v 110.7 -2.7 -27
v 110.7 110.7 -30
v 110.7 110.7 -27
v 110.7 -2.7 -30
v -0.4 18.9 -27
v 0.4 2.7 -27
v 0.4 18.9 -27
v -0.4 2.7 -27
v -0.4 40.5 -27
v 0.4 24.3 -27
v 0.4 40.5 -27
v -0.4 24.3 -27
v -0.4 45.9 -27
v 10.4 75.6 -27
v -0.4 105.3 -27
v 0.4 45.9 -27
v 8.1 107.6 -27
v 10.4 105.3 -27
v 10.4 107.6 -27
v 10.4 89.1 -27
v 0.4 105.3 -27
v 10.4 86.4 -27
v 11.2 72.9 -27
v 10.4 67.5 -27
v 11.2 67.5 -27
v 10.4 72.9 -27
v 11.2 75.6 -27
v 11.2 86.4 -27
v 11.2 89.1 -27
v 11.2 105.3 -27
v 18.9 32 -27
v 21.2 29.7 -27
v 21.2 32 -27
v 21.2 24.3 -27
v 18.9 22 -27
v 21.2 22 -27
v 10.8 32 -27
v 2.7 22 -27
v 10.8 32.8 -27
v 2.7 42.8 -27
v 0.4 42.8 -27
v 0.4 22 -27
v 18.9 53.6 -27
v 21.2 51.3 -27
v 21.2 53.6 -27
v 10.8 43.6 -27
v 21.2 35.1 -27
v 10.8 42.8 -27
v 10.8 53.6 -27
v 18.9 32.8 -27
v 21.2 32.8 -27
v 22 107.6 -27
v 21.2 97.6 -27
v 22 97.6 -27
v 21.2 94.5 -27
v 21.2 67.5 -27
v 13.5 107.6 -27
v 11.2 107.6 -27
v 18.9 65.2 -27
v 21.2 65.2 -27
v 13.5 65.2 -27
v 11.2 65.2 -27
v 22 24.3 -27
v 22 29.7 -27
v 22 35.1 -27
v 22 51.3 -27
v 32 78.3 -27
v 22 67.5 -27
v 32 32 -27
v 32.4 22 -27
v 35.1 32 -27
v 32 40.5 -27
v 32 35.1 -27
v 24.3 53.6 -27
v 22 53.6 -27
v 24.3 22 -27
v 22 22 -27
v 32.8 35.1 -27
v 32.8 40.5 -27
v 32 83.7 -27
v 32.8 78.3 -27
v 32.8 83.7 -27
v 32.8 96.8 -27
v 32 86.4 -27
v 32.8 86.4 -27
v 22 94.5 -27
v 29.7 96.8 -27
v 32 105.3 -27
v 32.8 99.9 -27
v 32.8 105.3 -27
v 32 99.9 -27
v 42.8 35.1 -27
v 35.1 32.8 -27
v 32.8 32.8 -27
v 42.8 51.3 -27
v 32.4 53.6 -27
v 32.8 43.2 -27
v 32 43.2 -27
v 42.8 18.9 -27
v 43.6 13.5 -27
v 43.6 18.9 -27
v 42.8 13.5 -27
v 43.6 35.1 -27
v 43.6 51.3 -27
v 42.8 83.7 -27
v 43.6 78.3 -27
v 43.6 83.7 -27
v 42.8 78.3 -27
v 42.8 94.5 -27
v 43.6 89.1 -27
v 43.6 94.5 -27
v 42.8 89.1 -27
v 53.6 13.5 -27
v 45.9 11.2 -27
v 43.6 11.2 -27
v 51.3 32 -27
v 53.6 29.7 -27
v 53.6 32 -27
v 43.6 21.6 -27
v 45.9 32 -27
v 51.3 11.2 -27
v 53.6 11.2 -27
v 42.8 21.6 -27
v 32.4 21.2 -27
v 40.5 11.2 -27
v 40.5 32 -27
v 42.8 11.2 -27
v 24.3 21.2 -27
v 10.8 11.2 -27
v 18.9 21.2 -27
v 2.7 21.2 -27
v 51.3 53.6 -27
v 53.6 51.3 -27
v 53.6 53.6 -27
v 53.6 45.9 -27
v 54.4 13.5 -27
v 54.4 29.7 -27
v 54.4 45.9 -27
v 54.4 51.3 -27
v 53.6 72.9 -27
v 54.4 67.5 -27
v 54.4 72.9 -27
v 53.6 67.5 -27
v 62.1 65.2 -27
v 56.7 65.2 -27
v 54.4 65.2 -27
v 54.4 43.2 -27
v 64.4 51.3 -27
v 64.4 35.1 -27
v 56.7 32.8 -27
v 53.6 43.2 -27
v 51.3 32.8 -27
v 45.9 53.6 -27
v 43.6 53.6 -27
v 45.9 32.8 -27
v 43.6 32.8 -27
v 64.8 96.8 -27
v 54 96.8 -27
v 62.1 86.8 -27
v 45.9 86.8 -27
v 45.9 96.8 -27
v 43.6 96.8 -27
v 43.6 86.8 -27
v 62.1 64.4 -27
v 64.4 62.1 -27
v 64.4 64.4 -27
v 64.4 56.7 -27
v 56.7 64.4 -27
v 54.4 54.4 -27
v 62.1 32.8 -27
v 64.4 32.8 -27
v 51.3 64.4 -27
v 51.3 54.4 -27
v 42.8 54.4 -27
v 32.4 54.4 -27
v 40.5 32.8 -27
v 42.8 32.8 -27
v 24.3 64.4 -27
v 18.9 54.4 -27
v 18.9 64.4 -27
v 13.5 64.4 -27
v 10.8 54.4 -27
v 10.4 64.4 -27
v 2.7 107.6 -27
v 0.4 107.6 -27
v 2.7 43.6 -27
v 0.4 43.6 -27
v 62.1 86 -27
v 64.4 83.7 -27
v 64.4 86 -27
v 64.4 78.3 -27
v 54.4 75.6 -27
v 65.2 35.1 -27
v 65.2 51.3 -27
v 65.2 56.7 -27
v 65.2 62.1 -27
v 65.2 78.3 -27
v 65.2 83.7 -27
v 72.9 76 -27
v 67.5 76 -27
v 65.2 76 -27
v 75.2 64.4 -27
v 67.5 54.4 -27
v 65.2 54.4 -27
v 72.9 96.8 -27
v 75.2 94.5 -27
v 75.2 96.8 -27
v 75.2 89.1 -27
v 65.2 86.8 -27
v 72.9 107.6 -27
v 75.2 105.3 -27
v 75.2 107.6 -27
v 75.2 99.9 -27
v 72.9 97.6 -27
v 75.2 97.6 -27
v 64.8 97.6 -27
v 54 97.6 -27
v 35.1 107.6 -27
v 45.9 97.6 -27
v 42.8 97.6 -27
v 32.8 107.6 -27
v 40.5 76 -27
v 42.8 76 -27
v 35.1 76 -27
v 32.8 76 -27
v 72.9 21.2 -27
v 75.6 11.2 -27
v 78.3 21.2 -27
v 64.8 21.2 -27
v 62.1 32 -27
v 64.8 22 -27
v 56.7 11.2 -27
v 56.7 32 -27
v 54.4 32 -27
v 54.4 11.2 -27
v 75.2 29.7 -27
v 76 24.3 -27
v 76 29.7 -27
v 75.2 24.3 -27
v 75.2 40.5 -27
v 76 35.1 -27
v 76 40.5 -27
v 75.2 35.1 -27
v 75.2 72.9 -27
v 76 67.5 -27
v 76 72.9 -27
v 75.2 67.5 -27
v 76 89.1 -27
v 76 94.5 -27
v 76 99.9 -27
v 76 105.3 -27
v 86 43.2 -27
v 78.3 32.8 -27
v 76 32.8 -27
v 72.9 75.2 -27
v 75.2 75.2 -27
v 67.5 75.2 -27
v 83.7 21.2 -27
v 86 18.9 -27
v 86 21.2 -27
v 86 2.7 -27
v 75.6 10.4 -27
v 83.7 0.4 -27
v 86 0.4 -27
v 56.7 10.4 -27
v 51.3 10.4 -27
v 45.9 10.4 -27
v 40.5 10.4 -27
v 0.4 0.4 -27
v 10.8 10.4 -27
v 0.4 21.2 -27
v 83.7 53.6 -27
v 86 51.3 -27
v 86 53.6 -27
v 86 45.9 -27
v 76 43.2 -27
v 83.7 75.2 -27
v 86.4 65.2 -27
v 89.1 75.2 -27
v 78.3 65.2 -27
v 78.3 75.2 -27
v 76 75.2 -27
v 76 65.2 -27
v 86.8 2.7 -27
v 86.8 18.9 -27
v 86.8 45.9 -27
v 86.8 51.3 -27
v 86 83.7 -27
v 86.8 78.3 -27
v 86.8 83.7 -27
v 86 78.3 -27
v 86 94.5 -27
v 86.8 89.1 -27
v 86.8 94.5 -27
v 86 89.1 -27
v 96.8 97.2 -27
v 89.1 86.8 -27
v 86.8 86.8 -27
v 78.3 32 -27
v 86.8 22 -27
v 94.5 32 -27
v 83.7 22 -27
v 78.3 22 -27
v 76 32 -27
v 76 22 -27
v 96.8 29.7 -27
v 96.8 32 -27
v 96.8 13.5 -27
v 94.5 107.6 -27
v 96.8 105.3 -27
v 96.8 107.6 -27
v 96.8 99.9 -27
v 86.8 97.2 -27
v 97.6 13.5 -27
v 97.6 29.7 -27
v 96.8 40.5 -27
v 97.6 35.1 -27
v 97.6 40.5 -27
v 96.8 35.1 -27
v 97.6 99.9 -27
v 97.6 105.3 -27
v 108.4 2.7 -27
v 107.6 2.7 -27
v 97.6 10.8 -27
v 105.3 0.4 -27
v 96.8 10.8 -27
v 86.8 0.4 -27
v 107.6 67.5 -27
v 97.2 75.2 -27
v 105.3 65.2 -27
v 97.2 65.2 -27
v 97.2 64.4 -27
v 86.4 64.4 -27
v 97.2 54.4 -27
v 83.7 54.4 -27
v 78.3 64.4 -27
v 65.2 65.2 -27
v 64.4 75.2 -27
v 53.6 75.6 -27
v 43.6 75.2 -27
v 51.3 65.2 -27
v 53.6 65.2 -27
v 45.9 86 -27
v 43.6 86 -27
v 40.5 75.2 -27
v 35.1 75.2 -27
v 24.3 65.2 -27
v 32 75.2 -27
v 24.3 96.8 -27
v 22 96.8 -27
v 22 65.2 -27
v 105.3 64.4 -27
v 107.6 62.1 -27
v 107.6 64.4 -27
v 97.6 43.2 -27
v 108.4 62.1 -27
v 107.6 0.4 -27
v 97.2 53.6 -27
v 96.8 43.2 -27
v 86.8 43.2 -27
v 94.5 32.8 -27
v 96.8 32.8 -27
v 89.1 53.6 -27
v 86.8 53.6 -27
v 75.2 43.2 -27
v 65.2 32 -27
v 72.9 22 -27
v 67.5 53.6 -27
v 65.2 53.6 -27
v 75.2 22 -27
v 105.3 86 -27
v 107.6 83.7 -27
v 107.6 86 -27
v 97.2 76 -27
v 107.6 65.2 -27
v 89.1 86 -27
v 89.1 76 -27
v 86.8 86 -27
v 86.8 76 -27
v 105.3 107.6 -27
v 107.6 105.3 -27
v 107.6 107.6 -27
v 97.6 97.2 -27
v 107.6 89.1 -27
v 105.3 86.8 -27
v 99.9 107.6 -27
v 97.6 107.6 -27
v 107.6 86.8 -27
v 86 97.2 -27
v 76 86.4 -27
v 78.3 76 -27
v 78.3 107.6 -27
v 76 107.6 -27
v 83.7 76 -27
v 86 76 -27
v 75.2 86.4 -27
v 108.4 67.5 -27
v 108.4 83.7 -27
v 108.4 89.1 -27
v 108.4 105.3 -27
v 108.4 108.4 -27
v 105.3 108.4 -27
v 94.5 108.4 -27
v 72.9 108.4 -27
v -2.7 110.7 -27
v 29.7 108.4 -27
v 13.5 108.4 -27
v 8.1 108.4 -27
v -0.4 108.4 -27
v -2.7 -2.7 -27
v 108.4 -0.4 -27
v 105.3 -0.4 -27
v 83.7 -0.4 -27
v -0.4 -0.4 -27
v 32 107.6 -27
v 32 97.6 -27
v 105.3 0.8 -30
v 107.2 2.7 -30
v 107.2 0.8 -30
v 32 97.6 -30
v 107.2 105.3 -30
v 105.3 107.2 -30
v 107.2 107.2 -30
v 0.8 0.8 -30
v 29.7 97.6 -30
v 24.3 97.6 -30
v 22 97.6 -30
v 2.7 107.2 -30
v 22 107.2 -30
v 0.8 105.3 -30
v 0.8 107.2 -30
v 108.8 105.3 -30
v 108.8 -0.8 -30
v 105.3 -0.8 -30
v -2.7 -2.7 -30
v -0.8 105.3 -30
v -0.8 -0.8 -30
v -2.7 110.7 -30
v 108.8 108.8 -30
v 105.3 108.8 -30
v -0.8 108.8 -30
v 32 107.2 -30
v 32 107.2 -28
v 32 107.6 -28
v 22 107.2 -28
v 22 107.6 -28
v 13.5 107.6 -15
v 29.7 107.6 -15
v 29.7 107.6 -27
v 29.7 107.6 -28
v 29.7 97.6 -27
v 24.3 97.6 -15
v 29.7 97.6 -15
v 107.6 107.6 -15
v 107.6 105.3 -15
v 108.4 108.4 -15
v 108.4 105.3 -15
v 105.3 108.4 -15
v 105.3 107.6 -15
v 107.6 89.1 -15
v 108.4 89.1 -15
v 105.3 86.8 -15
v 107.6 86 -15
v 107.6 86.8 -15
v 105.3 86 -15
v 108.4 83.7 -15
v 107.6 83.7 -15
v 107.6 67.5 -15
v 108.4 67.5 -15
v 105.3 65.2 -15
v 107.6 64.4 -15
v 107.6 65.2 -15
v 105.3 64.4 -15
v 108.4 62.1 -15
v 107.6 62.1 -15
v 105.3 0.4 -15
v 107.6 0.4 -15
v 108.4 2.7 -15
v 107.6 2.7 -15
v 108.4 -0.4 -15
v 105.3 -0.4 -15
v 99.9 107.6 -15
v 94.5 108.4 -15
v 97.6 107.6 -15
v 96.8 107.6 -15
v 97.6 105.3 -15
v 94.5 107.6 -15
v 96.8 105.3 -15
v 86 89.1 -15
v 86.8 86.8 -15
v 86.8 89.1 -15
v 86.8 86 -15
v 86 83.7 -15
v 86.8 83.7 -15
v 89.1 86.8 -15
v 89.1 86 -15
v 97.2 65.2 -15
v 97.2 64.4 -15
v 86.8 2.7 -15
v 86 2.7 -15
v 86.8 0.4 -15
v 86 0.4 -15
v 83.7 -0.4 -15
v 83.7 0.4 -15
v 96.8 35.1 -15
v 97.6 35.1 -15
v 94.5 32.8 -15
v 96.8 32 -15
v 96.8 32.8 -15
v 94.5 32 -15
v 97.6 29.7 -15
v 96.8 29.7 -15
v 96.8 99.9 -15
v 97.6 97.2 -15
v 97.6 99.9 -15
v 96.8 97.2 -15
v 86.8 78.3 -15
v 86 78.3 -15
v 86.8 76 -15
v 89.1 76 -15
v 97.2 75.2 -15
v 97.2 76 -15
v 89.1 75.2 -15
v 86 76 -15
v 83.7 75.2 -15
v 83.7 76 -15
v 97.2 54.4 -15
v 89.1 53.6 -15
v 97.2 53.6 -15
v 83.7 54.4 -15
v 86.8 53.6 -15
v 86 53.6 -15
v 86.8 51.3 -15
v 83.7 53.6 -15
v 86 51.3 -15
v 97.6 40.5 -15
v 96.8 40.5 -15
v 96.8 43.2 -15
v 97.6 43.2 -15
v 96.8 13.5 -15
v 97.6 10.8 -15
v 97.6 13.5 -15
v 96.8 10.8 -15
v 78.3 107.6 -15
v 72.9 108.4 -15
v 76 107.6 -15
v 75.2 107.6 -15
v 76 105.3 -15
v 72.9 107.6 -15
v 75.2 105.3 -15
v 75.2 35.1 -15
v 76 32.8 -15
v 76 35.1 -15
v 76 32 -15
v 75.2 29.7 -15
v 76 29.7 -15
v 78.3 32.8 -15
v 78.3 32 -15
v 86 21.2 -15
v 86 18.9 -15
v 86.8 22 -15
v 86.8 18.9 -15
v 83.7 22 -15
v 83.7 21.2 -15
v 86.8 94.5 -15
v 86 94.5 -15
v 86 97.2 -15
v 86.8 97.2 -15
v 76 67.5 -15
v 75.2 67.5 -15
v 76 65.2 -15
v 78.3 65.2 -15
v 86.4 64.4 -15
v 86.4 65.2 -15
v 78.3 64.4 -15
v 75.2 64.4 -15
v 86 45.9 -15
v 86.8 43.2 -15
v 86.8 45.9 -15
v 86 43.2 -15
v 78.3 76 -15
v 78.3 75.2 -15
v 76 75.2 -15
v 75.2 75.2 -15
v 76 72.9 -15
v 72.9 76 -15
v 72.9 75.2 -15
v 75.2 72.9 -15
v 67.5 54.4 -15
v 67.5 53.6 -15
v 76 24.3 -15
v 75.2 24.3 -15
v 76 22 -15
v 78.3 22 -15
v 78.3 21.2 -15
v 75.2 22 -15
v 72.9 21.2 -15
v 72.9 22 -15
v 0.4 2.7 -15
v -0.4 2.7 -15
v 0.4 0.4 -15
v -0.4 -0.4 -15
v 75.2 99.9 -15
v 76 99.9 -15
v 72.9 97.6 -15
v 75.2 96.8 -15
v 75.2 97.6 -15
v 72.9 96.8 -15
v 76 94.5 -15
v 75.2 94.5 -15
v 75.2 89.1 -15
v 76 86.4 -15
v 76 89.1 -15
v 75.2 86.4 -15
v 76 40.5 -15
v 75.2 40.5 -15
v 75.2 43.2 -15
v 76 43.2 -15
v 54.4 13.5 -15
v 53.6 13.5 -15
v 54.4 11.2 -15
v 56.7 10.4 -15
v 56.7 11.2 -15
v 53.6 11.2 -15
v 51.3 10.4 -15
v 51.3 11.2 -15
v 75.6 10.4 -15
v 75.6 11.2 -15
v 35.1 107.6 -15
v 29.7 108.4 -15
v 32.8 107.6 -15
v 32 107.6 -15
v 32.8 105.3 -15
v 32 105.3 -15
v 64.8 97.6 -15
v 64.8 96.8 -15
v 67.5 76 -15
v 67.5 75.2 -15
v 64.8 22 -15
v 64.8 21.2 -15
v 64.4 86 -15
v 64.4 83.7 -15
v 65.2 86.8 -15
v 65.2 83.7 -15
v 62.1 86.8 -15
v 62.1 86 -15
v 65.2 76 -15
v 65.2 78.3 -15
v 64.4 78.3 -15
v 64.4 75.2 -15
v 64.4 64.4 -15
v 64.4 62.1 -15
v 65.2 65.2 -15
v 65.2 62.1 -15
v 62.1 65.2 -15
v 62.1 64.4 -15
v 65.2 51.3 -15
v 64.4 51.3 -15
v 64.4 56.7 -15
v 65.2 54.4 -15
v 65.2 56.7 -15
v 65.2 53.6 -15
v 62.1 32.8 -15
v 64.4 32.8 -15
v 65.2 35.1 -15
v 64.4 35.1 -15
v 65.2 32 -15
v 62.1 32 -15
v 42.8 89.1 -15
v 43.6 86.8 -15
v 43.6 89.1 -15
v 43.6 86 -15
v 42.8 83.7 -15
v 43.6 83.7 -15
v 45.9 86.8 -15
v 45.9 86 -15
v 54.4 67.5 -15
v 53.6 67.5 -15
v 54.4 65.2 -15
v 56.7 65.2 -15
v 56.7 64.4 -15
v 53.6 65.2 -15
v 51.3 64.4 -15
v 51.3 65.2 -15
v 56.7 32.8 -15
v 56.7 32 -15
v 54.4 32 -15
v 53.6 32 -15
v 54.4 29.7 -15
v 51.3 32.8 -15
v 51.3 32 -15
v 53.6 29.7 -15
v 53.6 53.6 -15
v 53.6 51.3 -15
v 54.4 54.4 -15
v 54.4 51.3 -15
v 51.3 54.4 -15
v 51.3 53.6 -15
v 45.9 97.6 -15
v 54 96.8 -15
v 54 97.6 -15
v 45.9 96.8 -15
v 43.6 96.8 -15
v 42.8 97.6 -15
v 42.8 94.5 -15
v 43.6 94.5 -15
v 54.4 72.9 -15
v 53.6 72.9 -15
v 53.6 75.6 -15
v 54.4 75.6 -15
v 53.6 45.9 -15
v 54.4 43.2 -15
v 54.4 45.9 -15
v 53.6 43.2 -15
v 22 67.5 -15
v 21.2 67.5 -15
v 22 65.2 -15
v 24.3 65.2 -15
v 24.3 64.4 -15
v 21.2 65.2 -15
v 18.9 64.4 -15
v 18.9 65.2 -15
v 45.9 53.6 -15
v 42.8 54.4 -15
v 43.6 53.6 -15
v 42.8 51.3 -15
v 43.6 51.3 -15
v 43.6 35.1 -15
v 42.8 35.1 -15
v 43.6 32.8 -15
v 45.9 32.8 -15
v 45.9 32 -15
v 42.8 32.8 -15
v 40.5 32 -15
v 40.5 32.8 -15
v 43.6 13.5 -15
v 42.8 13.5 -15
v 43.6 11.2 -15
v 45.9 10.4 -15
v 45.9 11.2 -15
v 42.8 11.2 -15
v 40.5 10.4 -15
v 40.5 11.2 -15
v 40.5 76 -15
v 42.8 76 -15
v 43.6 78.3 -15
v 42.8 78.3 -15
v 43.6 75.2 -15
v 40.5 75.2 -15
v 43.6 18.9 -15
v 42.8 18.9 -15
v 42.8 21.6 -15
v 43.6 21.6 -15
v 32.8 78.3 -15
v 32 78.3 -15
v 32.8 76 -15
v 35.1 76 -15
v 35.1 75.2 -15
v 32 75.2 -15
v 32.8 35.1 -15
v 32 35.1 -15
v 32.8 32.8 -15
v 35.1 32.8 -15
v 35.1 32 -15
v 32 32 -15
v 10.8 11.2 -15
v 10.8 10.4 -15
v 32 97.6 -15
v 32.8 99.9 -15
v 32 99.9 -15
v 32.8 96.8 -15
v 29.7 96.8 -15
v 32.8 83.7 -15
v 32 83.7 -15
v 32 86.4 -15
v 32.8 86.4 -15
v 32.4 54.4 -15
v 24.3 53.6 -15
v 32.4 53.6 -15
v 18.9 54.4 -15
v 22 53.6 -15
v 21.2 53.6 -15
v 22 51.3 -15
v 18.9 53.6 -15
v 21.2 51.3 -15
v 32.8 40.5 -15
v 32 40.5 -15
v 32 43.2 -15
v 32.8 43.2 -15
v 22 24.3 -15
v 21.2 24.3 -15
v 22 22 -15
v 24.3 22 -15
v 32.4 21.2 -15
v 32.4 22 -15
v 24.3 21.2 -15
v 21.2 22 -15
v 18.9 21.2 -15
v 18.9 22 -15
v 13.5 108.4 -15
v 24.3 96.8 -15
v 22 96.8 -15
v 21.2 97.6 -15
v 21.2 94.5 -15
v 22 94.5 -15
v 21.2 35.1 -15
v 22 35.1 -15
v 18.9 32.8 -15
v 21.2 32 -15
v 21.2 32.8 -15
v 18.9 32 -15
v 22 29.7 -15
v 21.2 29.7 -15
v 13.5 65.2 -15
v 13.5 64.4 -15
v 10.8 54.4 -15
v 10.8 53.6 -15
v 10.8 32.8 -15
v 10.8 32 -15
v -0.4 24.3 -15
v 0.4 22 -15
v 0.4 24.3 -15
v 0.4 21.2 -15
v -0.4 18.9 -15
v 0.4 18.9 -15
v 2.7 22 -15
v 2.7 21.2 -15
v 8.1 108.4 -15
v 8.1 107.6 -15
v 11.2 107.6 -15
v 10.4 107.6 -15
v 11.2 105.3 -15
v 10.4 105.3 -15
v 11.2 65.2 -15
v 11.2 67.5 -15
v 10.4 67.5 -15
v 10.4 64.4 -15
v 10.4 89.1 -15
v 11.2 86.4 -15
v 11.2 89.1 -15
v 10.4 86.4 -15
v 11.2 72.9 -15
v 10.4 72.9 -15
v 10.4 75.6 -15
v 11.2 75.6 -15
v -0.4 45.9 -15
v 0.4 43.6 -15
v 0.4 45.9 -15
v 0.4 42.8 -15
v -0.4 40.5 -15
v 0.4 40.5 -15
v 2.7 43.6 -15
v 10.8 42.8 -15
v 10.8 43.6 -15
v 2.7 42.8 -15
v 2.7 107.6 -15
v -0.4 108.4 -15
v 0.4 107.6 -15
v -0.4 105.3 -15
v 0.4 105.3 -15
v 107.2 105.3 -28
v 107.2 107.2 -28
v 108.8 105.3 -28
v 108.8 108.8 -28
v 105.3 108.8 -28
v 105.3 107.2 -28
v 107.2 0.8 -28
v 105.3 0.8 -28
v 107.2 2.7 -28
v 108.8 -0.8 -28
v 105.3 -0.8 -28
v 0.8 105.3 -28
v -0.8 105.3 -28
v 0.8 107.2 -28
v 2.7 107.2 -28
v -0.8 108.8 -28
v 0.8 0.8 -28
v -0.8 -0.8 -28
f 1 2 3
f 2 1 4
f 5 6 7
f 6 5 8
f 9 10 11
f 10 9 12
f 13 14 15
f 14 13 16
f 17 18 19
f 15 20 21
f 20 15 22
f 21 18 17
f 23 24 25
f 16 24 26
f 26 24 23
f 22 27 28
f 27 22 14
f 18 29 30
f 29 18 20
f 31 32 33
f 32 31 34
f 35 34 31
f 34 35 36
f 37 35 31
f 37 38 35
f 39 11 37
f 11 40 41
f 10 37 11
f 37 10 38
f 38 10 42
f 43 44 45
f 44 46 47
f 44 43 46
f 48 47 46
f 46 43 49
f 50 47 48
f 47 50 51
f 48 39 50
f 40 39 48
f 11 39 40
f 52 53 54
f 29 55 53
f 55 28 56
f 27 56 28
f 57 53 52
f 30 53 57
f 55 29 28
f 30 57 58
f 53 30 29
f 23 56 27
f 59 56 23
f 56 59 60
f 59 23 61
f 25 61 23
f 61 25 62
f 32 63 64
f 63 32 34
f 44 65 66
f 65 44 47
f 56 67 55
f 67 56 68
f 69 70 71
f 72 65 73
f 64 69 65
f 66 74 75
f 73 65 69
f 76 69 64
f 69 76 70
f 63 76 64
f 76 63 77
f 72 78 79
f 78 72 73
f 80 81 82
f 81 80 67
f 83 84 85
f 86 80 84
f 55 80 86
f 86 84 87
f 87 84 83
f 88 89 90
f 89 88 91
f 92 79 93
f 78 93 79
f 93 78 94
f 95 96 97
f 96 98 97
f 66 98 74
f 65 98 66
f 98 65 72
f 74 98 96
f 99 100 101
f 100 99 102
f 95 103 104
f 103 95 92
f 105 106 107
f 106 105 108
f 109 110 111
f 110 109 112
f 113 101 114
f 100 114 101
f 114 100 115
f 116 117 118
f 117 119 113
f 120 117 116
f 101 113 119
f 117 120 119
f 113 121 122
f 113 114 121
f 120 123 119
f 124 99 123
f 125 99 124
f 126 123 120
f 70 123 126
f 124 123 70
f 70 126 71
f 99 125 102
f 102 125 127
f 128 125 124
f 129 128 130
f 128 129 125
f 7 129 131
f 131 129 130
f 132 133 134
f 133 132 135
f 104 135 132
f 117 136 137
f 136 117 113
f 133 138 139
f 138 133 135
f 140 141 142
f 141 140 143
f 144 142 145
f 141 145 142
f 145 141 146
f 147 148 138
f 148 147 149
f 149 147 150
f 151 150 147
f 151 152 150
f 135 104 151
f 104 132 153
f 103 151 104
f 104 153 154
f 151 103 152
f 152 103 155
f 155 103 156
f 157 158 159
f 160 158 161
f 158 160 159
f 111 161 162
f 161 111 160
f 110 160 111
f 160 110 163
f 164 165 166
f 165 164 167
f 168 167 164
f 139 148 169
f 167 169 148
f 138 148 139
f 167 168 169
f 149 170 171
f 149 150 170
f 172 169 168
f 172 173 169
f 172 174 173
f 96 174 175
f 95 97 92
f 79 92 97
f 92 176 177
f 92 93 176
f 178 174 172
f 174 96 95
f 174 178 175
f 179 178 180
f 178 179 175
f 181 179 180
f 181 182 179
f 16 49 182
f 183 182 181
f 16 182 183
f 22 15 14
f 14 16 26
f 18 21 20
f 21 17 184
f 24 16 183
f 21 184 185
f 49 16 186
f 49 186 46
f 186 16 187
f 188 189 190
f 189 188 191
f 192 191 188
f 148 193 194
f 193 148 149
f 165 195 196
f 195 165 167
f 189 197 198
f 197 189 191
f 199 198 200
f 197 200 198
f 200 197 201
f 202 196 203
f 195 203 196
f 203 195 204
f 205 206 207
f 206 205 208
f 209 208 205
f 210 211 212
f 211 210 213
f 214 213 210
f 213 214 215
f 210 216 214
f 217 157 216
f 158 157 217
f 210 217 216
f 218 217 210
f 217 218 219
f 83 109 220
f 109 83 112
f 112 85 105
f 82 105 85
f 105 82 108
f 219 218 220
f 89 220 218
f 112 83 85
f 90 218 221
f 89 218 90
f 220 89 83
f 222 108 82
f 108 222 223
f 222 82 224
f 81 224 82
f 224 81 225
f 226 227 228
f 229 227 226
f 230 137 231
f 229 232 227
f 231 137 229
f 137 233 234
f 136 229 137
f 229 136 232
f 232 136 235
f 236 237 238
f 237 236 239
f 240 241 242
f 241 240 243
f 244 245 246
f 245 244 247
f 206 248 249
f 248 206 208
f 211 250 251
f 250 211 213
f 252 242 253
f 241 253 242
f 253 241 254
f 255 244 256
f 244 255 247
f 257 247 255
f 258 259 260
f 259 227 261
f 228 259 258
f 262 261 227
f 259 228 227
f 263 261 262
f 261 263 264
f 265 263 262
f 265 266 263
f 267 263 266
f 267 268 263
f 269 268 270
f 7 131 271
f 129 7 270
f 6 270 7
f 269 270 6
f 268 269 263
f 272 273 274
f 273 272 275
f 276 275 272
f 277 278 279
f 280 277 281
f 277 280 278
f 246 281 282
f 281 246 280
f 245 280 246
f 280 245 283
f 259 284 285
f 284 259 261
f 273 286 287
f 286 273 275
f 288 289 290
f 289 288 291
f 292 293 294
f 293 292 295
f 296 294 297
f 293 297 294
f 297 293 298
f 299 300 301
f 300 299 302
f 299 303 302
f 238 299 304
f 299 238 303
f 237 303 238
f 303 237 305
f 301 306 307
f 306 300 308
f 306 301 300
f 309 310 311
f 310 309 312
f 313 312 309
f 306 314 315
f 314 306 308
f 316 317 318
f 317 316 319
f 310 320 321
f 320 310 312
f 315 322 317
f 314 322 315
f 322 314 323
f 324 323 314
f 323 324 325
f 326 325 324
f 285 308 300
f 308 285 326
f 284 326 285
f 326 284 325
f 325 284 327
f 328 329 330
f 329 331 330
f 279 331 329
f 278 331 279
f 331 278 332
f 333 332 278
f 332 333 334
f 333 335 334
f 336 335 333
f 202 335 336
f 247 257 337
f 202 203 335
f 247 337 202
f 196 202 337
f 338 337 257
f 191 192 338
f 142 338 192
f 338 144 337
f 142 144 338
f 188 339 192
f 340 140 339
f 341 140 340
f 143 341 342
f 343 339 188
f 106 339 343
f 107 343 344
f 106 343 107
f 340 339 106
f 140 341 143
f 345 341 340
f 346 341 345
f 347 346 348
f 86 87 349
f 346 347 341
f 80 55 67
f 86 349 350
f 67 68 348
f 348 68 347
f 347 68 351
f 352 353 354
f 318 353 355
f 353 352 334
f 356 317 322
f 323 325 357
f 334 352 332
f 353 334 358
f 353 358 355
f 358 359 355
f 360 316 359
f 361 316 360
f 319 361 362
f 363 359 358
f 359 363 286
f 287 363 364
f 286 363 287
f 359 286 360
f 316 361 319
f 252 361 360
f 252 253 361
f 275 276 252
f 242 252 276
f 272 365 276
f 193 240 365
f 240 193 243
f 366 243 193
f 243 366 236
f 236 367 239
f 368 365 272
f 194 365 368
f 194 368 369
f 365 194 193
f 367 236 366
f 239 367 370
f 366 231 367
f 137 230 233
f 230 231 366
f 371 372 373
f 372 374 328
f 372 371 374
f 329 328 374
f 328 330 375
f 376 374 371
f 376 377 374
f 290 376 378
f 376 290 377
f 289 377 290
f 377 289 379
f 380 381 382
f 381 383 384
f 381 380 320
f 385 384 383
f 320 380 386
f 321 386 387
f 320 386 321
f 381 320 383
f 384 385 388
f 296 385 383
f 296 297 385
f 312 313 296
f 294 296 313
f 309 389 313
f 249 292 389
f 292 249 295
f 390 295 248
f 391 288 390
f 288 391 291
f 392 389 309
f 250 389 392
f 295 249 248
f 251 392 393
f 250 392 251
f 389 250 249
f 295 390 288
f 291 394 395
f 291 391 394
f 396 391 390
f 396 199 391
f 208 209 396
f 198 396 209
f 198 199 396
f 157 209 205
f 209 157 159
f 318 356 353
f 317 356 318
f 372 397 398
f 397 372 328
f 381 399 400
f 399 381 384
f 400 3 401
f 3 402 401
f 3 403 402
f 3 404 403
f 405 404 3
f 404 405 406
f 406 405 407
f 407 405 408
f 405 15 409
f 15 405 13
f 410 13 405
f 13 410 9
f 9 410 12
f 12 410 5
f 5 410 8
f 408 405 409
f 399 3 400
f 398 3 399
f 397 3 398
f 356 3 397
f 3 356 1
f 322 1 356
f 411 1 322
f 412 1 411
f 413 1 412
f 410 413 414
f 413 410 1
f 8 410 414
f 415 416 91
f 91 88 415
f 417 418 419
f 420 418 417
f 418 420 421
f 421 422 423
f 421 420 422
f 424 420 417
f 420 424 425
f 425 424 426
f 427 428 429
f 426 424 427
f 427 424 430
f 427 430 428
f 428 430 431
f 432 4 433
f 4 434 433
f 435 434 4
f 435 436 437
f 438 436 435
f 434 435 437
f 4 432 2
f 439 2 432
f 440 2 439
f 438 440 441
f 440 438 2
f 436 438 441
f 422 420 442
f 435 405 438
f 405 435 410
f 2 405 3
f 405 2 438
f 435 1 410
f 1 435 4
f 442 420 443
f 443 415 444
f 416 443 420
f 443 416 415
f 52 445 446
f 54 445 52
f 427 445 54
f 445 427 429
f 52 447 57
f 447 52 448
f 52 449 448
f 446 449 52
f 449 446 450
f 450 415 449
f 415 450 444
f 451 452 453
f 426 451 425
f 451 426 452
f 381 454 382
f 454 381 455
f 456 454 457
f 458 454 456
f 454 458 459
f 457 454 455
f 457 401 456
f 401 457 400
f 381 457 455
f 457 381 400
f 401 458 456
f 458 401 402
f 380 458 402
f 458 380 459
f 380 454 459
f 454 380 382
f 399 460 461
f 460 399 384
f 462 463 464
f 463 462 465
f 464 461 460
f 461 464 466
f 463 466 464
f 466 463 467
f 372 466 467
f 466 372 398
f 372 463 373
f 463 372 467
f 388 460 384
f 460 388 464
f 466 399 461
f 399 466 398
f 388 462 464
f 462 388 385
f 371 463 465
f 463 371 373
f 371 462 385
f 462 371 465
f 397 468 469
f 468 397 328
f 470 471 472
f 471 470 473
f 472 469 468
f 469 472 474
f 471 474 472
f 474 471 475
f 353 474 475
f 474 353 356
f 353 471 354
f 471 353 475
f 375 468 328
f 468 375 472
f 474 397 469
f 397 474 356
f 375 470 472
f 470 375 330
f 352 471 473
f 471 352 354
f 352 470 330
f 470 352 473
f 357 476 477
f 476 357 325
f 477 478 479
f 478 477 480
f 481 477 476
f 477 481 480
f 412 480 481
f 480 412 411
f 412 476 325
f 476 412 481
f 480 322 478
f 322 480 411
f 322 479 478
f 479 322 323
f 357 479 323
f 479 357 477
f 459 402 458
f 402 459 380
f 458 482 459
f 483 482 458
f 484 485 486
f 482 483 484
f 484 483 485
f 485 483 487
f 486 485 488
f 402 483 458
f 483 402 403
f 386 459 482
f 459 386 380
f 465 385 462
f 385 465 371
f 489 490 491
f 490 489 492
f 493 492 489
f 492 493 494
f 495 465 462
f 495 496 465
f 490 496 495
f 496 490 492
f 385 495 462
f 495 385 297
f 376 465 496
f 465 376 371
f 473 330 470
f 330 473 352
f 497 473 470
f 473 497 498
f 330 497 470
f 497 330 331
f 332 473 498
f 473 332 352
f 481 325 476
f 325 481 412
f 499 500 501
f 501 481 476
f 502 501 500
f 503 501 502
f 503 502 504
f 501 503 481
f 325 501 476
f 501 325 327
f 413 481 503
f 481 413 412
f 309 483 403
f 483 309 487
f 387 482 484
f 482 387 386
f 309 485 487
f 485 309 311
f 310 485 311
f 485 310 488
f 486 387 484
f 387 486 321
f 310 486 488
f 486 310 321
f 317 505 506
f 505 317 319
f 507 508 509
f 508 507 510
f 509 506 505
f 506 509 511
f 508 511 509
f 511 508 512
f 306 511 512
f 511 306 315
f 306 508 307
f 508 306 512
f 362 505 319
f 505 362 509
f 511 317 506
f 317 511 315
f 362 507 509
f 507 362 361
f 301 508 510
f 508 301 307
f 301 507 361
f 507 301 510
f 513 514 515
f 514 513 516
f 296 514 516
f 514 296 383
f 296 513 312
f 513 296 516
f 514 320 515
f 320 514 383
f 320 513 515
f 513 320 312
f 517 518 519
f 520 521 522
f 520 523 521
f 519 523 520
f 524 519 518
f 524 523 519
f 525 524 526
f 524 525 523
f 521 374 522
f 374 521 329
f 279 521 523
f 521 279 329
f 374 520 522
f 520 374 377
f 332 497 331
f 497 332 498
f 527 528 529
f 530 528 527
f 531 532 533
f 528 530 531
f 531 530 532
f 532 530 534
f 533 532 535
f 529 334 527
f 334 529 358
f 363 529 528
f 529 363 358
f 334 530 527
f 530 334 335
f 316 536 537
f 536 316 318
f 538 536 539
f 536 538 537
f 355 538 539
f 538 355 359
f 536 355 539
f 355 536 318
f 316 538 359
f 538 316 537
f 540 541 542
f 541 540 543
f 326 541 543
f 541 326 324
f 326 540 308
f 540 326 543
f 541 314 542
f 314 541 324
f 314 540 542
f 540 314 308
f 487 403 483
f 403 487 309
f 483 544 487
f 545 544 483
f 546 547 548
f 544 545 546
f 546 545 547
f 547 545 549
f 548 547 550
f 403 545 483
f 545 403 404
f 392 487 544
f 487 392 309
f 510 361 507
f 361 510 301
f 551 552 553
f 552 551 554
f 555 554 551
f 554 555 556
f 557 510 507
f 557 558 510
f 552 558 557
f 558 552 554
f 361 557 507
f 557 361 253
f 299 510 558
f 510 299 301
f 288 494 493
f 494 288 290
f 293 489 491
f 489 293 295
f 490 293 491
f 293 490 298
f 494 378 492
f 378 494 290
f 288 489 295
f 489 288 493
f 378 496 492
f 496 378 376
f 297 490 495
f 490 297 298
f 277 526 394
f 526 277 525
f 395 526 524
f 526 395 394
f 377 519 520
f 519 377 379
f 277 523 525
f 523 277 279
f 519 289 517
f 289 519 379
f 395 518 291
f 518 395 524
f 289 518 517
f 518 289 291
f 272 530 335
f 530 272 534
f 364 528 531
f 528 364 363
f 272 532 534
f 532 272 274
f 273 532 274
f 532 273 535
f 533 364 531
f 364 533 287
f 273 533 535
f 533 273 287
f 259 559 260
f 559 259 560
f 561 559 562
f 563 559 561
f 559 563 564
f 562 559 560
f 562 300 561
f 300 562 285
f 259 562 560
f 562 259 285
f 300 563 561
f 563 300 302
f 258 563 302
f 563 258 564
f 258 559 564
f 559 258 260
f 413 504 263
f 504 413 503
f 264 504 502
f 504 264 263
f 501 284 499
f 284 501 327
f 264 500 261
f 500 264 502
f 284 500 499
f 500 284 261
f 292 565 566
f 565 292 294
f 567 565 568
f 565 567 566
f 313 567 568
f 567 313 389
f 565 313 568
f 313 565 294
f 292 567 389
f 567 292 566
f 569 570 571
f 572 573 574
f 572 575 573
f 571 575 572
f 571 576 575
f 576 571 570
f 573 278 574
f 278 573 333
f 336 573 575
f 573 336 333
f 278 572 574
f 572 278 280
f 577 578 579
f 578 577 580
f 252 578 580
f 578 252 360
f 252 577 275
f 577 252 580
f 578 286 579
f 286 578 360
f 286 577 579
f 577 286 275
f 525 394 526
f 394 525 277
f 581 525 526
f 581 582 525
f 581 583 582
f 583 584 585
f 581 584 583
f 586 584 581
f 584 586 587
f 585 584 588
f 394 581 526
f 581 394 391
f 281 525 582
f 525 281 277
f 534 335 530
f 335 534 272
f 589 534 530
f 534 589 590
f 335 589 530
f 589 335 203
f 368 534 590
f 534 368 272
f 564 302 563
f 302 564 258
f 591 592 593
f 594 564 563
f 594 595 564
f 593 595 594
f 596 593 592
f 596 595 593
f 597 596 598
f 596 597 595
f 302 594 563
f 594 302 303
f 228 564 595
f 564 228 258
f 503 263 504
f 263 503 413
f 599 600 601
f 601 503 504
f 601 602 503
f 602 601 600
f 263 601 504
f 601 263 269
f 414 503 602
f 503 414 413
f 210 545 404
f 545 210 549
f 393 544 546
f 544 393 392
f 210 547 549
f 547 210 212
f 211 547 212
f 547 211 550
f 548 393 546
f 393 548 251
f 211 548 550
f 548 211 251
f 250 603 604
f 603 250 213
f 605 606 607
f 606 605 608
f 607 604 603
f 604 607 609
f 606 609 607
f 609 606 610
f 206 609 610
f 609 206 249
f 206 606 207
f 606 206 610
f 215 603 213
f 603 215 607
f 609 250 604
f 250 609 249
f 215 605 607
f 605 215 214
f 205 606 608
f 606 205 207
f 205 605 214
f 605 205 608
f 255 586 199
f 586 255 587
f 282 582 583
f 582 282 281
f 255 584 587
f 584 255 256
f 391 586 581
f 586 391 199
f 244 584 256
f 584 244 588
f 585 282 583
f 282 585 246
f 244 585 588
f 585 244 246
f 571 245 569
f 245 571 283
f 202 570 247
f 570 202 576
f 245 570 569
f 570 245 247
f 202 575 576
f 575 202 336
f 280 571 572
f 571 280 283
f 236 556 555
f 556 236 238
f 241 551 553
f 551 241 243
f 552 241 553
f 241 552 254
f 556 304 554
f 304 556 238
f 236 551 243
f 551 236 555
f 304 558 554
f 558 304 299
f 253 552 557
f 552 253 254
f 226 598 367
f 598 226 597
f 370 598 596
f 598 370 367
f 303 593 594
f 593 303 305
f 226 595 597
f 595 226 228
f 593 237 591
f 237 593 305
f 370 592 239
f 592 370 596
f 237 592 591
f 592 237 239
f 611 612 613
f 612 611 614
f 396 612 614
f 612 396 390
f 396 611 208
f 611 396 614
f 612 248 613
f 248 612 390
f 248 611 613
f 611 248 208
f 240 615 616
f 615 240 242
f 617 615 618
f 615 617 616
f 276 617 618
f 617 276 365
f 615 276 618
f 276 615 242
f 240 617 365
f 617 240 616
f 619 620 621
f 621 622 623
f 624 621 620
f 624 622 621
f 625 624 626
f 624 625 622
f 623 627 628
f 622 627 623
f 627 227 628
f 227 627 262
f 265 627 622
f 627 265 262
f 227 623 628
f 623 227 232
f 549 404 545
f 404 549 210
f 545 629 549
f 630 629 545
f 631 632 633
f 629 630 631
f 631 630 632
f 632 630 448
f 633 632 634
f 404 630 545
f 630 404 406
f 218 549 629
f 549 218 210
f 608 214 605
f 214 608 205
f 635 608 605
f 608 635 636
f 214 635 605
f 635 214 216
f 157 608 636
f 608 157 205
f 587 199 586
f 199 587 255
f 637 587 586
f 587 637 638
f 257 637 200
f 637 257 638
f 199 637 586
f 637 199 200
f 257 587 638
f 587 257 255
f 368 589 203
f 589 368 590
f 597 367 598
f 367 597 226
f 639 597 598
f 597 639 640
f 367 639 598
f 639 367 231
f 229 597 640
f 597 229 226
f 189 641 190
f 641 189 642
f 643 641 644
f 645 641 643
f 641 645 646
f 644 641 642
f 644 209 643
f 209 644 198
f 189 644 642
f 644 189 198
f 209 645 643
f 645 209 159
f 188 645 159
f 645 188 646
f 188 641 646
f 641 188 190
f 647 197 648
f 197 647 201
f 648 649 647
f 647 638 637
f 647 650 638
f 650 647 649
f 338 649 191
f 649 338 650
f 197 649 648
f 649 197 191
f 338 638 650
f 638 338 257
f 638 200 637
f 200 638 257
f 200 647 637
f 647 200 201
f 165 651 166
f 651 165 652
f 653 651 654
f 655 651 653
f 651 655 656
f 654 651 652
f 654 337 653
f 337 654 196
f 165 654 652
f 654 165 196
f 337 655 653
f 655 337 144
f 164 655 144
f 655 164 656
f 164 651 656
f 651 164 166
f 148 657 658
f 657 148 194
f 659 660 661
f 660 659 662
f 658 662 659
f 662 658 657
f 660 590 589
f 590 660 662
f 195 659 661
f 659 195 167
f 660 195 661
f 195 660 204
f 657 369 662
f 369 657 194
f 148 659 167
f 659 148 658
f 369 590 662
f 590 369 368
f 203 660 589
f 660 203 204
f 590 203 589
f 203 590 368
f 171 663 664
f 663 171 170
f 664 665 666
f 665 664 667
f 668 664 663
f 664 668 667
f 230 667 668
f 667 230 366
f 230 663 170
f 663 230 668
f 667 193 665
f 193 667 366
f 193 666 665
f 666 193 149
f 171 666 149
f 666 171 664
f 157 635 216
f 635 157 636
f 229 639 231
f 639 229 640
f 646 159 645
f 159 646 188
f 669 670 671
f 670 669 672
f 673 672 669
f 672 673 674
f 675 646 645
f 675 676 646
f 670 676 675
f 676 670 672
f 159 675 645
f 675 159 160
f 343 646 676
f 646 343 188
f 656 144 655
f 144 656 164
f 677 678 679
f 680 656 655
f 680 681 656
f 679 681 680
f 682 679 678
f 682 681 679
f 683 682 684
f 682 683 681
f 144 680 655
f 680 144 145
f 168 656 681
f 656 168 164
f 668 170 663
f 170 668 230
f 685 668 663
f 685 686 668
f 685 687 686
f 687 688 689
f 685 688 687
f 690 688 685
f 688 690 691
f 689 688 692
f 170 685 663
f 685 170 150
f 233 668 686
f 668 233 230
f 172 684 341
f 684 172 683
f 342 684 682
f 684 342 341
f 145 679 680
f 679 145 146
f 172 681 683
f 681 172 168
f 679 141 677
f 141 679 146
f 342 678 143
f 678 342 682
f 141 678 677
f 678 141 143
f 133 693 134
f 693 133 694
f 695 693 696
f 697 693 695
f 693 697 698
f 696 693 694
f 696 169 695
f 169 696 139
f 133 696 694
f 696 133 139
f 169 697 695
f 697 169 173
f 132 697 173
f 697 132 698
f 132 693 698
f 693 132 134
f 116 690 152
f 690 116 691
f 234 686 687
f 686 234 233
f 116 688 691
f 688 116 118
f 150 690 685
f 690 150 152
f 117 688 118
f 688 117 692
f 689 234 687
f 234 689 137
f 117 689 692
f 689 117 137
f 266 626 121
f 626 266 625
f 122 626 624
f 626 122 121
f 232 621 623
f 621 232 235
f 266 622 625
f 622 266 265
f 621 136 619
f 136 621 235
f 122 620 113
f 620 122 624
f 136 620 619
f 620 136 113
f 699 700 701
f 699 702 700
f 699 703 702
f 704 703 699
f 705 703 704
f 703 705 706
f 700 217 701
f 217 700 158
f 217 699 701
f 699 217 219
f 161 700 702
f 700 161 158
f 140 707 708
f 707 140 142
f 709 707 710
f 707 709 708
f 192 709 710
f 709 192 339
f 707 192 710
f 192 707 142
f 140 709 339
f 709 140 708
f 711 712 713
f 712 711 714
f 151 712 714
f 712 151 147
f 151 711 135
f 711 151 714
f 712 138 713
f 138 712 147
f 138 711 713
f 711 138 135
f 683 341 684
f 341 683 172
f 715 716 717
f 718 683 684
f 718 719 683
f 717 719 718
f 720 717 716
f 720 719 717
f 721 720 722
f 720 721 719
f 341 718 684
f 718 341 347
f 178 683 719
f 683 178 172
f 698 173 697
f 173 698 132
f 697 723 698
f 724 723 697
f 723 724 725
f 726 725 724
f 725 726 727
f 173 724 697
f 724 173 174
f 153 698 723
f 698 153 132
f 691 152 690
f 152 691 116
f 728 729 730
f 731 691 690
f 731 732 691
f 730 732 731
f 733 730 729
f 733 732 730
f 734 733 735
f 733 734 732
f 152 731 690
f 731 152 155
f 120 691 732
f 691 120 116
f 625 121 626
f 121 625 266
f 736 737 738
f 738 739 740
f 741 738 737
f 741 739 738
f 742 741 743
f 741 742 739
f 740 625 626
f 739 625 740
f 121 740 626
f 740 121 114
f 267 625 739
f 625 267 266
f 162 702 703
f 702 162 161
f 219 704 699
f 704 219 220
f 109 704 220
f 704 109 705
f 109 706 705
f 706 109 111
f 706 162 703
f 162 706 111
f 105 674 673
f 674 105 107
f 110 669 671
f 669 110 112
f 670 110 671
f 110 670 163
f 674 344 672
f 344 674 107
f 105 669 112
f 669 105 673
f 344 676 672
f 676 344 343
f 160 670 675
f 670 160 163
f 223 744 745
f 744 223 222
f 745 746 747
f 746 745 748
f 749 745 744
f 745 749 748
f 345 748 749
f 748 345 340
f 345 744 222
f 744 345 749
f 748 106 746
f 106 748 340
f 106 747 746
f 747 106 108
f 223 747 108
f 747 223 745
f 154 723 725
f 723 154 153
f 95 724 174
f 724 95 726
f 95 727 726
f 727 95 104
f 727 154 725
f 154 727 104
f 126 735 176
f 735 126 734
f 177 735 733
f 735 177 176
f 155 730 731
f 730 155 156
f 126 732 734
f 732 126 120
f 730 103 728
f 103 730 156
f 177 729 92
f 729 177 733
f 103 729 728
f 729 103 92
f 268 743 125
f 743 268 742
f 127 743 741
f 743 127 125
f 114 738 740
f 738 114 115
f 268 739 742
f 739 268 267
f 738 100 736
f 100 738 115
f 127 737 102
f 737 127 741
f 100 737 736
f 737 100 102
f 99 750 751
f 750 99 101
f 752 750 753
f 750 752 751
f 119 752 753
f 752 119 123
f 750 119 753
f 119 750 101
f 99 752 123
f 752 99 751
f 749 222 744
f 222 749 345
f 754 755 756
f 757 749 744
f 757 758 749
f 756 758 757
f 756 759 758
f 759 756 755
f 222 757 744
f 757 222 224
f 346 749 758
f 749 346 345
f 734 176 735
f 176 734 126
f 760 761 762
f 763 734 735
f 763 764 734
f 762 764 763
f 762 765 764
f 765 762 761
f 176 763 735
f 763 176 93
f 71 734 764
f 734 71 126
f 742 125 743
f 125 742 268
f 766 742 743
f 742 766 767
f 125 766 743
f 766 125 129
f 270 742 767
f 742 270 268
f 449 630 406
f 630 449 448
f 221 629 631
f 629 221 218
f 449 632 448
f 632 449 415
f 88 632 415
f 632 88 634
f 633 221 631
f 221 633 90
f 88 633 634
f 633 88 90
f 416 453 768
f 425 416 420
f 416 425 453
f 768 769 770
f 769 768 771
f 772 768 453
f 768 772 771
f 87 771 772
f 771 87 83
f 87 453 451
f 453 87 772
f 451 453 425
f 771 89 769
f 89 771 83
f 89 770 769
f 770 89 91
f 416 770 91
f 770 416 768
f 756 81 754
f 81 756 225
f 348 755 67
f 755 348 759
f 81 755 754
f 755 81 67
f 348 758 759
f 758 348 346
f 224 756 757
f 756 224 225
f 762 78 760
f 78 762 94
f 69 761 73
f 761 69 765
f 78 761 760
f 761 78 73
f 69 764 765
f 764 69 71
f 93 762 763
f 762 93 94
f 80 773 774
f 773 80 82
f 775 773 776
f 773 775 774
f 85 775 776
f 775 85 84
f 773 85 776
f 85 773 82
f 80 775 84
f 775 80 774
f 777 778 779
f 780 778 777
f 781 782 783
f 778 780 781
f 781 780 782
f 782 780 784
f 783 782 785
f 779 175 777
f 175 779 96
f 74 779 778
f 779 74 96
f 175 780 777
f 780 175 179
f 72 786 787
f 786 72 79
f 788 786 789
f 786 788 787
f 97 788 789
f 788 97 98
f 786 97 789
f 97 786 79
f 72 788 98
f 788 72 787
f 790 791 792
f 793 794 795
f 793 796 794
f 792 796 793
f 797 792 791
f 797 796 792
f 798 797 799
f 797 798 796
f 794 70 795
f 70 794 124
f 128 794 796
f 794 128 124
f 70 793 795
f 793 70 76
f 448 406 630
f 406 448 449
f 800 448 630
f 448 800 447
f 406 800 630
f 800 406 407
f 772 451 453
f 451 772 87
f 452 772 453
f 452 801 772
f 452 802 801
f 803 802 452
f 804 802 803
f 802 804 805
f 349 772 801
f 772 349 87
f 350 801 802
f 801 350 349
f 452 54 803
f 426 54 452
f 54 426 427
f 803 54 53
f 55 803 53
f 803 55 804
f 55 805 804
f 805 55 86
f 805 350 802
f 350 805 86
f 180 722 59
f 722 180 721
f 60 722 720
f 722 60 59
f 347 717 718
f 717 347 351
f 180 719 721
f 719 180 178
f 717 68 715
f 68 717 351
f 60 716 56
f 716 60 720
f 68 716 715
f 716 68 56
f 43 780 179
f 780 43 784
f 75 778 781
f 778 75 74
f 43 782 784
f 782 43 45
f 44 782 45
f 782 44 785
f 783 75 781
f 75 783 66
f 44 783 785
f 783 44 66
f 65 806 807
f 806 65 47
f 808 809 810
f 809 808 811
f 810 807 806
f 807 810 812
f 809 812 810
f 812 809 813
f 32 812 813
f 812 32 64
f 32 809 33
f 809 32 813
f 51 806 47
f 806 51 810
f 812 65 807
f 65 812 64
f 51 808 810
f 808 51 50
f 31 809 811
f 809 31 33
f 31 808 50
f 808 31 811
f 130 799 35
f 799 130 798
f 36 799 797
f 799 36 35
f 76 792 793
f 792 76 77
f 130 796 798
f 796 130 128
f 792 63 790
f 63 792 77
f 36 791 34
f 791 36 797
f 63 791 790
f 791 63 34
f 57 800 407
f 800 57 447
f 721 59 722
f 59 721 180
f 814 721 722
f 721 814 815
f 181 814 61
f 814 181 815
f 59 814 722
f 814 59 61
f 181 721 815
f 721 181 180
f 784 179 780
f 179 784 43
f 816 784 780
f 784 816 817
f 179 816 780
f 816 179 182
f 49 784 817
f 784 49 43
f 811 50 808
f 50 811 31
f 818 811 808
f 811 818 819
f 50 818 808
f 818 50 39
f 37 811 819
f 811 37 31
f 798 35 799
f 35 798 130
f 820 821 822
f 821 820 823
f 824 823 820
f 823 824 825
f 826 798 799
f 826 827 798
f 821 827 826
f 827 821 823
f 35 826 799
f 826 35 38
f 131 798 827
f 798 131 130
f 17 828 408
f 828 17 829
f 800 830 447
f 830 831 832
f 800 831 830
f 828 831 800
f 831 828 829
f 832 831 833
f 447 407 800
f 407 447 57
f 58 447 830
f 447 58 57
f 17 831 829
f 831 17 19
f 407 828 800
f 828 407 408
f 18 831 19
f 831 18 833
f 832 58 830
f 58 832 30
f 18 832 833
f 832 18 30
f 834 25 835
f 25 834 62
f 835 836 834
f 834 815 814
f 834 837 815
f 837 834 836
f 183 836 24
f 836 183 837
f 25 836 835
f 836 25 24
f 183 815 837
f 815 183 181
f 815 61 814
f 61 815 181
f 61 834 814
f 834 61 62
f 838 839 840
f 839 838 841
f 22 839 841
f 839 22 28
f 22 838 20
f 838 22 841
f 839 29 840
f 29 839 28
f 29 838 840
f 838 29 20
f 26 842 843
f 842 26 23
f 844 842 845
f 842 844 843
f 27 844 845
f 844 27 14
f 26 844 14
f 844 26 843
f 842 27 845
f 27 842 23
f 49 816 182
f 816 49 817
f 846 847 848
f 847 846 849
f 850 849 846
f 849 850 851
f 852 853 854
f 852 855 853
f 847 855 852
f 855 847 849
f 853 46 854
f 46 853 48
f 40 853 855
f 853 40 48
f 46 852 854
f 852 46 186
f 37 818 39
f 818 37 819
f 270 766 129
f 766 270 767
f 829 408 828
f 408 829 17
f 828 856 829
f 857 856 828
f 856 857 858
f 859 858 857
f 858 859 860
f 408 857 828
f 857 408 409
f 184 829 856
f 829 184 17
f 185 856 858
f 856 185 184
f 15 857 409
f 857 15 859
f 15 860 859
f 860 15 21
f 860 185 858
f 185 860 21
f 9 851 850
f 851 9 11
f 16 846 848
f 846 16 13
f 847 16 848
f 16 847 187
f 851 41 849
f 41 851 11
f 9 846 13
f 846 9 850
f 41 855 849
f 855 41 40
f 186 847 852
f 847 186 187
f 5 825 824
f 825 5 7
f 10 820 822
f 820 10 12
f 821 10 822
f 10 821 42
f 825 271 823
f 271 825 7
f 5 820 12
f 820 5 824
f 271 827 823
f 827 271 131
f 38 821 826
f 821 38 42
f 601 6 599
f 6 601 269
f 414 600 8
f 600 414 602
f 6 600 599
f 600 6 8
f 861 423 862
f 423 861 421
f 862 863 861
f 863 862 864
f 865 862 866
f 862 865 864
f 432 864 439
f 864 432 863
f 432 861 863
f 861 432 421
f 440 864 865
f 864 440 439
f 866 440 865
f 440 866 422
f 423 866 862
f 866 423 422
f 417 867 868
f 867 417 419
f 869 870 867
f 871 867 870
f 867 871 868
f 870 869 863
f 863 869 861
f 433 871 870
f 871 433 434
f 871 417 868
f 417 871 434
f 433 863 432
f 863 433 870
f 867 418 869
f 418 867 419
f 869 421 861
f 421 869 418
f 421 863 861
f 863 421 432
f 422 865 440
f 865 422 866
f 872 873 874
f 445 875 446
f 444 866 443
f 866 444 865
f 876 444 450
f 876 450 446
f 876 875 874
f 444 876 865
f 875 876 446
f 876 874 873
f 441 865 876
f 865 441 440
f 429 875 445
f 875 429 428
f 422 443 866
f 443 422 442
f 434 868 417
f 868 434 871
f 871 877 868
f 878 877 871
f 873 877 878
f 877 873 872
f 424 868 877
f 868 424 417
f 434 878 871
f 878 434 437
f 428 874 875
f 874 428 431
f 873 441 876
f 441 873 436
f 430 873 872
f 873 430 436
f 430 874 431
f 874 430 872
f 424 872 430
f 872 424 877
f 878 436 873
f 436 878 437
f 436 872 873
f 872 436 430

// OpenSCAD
// file: ../../code/enclosing-box.scad
module box(levels) {
    count = len(levels);
    l1 = levels[0];
    sw = len(l1);
    extraSpace = 3*nozzleDiameter;
    bt = nozzleDiameter*3; // box wall thickness
    
    b1Xs = sw*w + extraSpace; // box inside X size
    b1Ys = b1Xs;
    b1Zs = (wh-levelOverlap)*count+levelOverlap + extraSpace;
    
    
    echo("Box insides: ", b1Xs, b1Ys, b1Zs);
    rotate([180,0,0])
    difference() {
        translate([-bt, -bt, 0])
            cube([
                b1Xs+2*bt, 
                b1Ys+2*bt, 
                b1Zs+1*bt
            ]);
        cube([b1Xs, b1Ys, b1Zs]);

        
        // hole for ball entrance
        xy=extraSpace+w/2;
        translate([xy,xy,b1Zs+bt-2*layerHeight]) {
            holes(l1, STARTING_POINT);
        }

        
        translate([0,0,b1Zs+bt-2*layerHeight]) {
            // draw levels on box
            for(i = [1:count]) {
                marginX =     b1Ys/count   - extraSpace;
                marginY = (i*(b1Ys/count)) - extraSpace;
                translate([b1Xs-marginX, b1Ys-marginY, 0])
                levelContour(levels[i-1], count);
            }
        }
    }   
}


module levelContour(level, count) {
    // scale down to fit all mazes into one row on top of the box
    scale(1/count) {
        // count is used in wallThickness multiplication here to compensate scale down factor
        // also, to make walls visible better, increasing adding additional multiplication factor
        walls(level, 2*count*wallThickness); 
    }
}
// file: ../../code/main.scad
include <enclosing-box.scad>;

// DRAWING SYMBOLS
WALL_VERTICAL = "|";
WALL_VERTICAL_TOP = "╹";
WALL_VERTICAL_BOTTOM = "╻";
WALL_HORIZONTAL = "─";
WALL_HORIZONTAL_LEFT = "╸";
WALL_HORIZONTAL_RIGHT = "╺";

CORNER_PLUS="+";

CORNER_TOP_LEFT="┌";
CORNER_TOP_RIGHT= "┐";
CORNER_BOTTOM_RIGHT="┘";
CORNER_BOTTOM_LEFT="└";

CORNER_T="┬";
CORNER_T_DOWN="┴";
CORNER_T_LEFT="├";
CORNER_T_RIGHT="┤";

SPACE = " ";
HOLE = "X";
STARTING_POINT = "O";

template3x3 = [
"┌───────┐",
"|X      |",
"| ┌─┬─┐ |",
"| | ╹ | |",
"| ├╸+╺┤ |",
"| | ╻ | |",
"| └─┴─┘ |",
"|      O|",
"└───────┘"];


// PARAMETERS
ballSize = 12;

levelOverlap = 2; // how much below level should go into the bottom plate
bpt = levelOverlap + 1; // bottom plate thickness
nozzleDiameter = 0.4;
layerHeight = 0.2;
wallThickness = nozzleDiameter*2; // wall thickness
wh = ballSize+bpt+levelOverlap; // wall height


// VARIABLES
w = ballSize/2+wallThickness/2; // width of the cell


// HELPER METHODS
module labyrinthLevels(currentLevel, levelBelow) {
    difference() {
        labyrinth(currentLevel);
        translate([0,0,-wh+levelOverlap])
            labyrinth(levelBelow, wallThickness+nozzleDiameter*2); // add extra two lines space for walls' overlap
    }
}

module labyrinth(lab, wallThickness = wallThickness) {
    bottom(lab);
    walls(lab, wallThickness);
}

module bottom(lab) {
    sw=len(lab[0]);
    boardSize = sw*w;
    difference() {
        translate([-w/2,-w/2,0])
            cube([boardSize, boardSize, bpt]);
        holes(lab);
    }
}

module walls(lab, wallThickness=wallThickness) {
    sw=len(lab[0]);
    for(x=[0:sw-1]) {
        for(y=[0:sw-1]) {
            cell = lab[x][y];
            tx=sw-x-1; ty=sw-y-1;
            translate([tx*w, ty*w, 0]) {
                if (cell == WALL_VERTICAL) {
                    wallVertical(wallThickness);
                } else if (cell == WALL_VERTICAL_TOP) {
                    wallVerticalTop(wallThickness);
                } else if (cell == WALL_VERTICAL_BOTTOM) {
                    wallVerticalBottom(wallThickness);
                } else if (cell == WALL_HORIZONTAL) {
                    wallHorizontal(wallThickness);
                } else if (cell == WALL_HORIZONTAL_LEFT) {
                    wallHorizontalLeft(wallThickness);
                } else if (cell == WALL_HORIZONTAL_RIGHT) {
                    wallHorizontalRight(wallThickness);
                } else if (cell == CORNER_TOP_LEFT) {
                    cornerTopLeft(wallThickness);
                } else if (cell == CORNER_TOP_RIGHT) {
                    cornerTopRight(wallThickness);
                } else if (cell == CORNER_BOTTOM_RIGHT) {
                    cornerBottomRight(wallThickness);
                } else if (cell == CORNER_BOTTOM_LEFT) {
                    cornerBottomLeft(wallThickness);
                } else if (cell == CORNER_T) {
                    cornerT(wallThickness);
                } else if (cell == CORNER_T_RIGHT) {
                    cornerTRight(wallThickness);
                } else if (cell == CORNER_T_DOWN) {
                    cornerTDown(wallThickness);
                } else if (cell == CORNER_T_LEFT) {
                    cornerTLeft(wallThickness);
                } else if (cell == CORNER_PLUS) {
                    cornerPlus(wallThickness);
                }
            }
        }
    }
}

module holes(lab, holeSymbol = HOLE) {
    sw=len(lab[0]);
    for(x=[0:sw-1]) {
        for(y=[0:sw-1]) {
            cell = lab[x][y];
            if (cell == holeSymbol) {
                tx=sw-x-1; ty=sw-y-1;
                translate([tx*w, ty*w, 0]) {
                    hole();
                }
            }
        }
    }
}

module hole() {
    s=w+w-wallThickness;
    translate([-s/2,-s/2, -1])
        cube([s, s, bpt+2]);
}

module wallHorizontal(wallThickness) {
    rotate([0,0,90])
        wall(wallThickness);
}

module wallVertical(wallThickness) {
    wall(wallThickness);
}
module wallVerticalTop(wallThickness) {
    wallHalf(wallThickness);
}
module wallVerticalBottom(wallThickness) {
    rotate([0,0,180])
        wallHalf(wallThickness);
}
module wallHorizontalLeft(wallThickness) {
    rotate([0,0,90])
        wallHalf(wallThickness);
}
module wallHorizontalRight(wallThickness) {
    rotate([0,0,270])
        wallHalf(wallThickness);
}

module wall(wallThickness) {
    translate([-w/2,-wallThickness/2, 0])
        cube([w, wallThickness, wh]);
}
module wallHalf(wallThickness) {
    translate([0,-wallThickness/2, 0])
        cube([w/2, wallThickness, wh]);
}

module cornerTopLeft(wallThickness) {
    rotate([0,0,180])
        corner(wallThickness);
}
module cornerTopRight(wallThickness) {
    rotate([0,0,90])
        corner(wallThickness);
}
module cornerBottomRight(wallThickness) {
    corner(wallThickness);
}
module cornerBottomLeft(wallThickness) {
    rotate([0,0,270])
        corner(wallThickness);
}

module corner(wallThickness) {
    translate([-wallThickness/2,-wallThickness/2,0])
        cube([wallThickness, w/2+wallThickness/2, wh]);
    translate([-wallThickness/2,-wallThickness/2, 0])
        cube([w/2+wallThickness/2, wallThickness, wh]);
}

module cornerPlus(wallThickness) {
    translate([-w/2,-wallThickness/2, 0])
        cube([w, wallThickness, wh]);    
    translate([-wallThickness/2,-w/2,0])
        cube([wallThickness, w, wh]);
}

module cornerT(wallThickness) {
    rotate([0,0,90]) {
        translate([-w/2,-wallThickness/2, 0])
            cube([w, wallThickness, wh]);    
        translate([-wallThickness/2,-wallThickness/2,0])
            cube([wallThickness, w/2+wallThickness/2, wh]);
    }
}

module cornerTRight(wallThickness) {
    rotate([0,0,270])
        cornerT(wallThickness);
}

module cornerTDown(wallThickness) {
    rotate([0,0,180])
        cornerT(wallThickness);
}

module cornerTLeft(wallThickness) {
    rotate([0,0,90])
        cornerT(wallThickness);
}
// main file
include <../../code/main.scad>

ballSize = 10;

allLevels();

module allLevels() {
    labyrinthLevels(lvl1, lvl2);
    translate([0,0,-wh])
        labyrinthLevels(lvl2, lvl3);
    !translate([0,0,-2*wh])
        labyrinthLevels(lvl3, lvl4);
    translate([0,0,-3*wh])
        labyrinthLevels(lvl4, lvl5);
    translate([0,0,-4*wh])
        labyrinthLevels(lvl5, lvl6);
    translate([0,0,-5*wh])
        labyrinthLevels(lvl6, lvl7);
    translate([0,0,-6*wh])
        labyrinthLevels(lvl7, lvl8);
    translate([0,0,-7*wh])
        labyrinthLevels(lvl8, lvl9);
    translate([0,0,-8*wh])
        labyrinth(lvl10);
}



template3x3 = [
"┌───────┐",
"|X      |",
"| ┌─┬─┐ |",
"| | ╹ | |",
"| ├╸+╺┤ |",
"| | ╻ | |",
"| └─┴─┘ |",
"|      O|",
"└───────┘"];

// Generated with http://www.delorie.com/game-room/mazes/genmaze.cgi
lvl1 = [
"┌-----┬-------------┐",
"|O    |             |",
"├---╸ | ┌-╸ ┌-----╸ |",
"|     | |   |       |",
"| ╺---┤ └-┬-┴---┬---┤",
"|     |   |     |   |",
"├-┬-╸ ├-╸ └---┐ ╹ ╻ |",
"| |   |       |   | |",
"| ╹ ┌-┘ ╺---┐ └-┬-┘ |",
"|   |       |   |   |",
"| ╻ | ┌---╸ ├-╸ ╹ ╻ |",
"| | | |     |     | |",
"├-┘ ├-┘ ╻ ┌-┴-----┘ |",
"|   |   | |         |",
"| ┌-┘ ┌-┤ ├-------┬-┤",
"| |   | | |       | |",
"| ╹ ╻ ╹ | ╹ ┌---┐ | |",
"|   |   |   |   | | |",
"├---┴---┴-╸ | ╺-┘ ╹ |",
"|           |X      |",
"└-----------┴-------┘"
];

lvl2 = [
"┌---┬---┬---┬-------┐",
"|X  |   |   |       |",
"├-╸ ╹ ╻ ╹ ╺-┤ ┌-┬-╸ |",
"|     |     | | |   |",
"| ┌---+-┬-╸ | | ╹ ╻ |",
"| |   | |   | |   | |",
"| └-╸ | ╹ ┌-┘ ├---┘ |",
"|     |   |   |     |",
"| ╺-┬-┴-┬-┘ ┌-+-╸ ┌-┤",
"|   |   |   | |   | |",
"├-╸ | ╻ ├-╸ | ╹ ╺-┤ |",
"|   | | |   |     | |",
"| ╺-┤ | ╹ ┌-┴-┐ ╻ | |",
"|   | |   |   | | | |",
"| ╻ | └---┘ ╻ ├-┘ | |",
"| | |       | |   | |",
"├-┘ ├-----┬-┘ | ╺-┘ |",
"|   |     |   |     |",
"| ╺-┘ ╻ ╻ ╹ ┌-┴---╸ |",
"|     | |   |O      |", 
"└-----┴-┴---┴-------┘"];
lvl3 = [
"┌---┬---┬-----------┐",
"|O  |   |           |",
"├-╸ | ╻ ╹ ╻ ╺-┬---╸ |",
"|   | |   |   |     |",
"| ╺-┴-┤ ╻ ├-╸ | ┌---┤",
"|     | | |   | |   |",
"├-┬-╸ ├-┘ | ╺-┴-┤ ╻ |",
"| |   |   |     | | |",
"| ╹ ┌-┘ ┌-┴---┐ ╹ | |",
"|   |   |     |   | |",
"| ╻ | ╺-┤ ┌-╸ ├---┤ |",
"| | |   | |   |   | |",
"| └-┴-┐ | └---┤ ╺-┤ |",
"|     | |     |   | |",
"├-┐ ╺-┘ | ╻ ╺-┘ ╻ | |",
"|X|     | |     | | |",
"| └-----┤ ├---┬-┤ | |",
"|       | |   | | | |",
"├---╸ ╺-┘ ╹ ╻ ╹ | ╹ |",
"|           |   |   |", 
"└-----------┴---┴---┘"];
lvl4 = [
"┌───────────────────┐",
"|                   |",
"|                   |",
"|                   |",
"|                   |",
"|                   |",
"|                   |",
"|                   |",
"|                   |",
"|                   |",
"|                   |",
"|                   |",
"|                   |",
"|                   |",
"|                   |",
"|                   |",
"|                   |",
"|                   |",
"|                   |",
"|                   |", 
"└───────────────────┘"];
lvl5 = [
"┌───────────────────┐",
"|                   |",
"|                   |",
"|                   |",
"|                   |",
"|                   |",
"|                   |",
"|                   |",
"|                   |",
"|                   |",
"|                   |",
"|                   |",
"|                   |",
"|                   |",
"|                   |",
"|                   |",
"|                   |",
"|                   |",
"|                   |",
"|                   |", 
"└───────────────────┘"];
lvl6 = [
"┌───────────────────┐",
"|                   |",
"|                   |",
"|                   |",
"|                   |",
"|                   |",
"|                   |",
"|                   |",
"|                   |",
"|                   |",
"|                   |",
"|                   |",
"|                   |",
"|                   |",
"|                   |",
"|                   |",
"|                   |",
"|                   |",
"|                   |",
"|                   |", 
"└───────────────────┘"];
lvl7 = [
"┌───────────────────┐",
"|                   |",
"|                   |",
"|                   |",
"|                   |",
"|                   |",
"|                   |",
"|                   |",
"|                   |",
"|                   |",
"|                   |",
"|                   |",
"|                   |",
"|                   |",
"|                   |",
"|                   |",
"|                   |",
"|                   |",
"|                   |",
"|                   |", 
"└───────────────────┘"];
lvl8 = [
"┌───────────────────┐",
"|                   |",
"|                   |",
"|                   |",
"|                   |",
"|                   |",
"|                   |",
"|                   |",
"|                   |",
"|                   |",
"|                   |",
"|                   |",
"|                   |",
"|                   |",
"|                   |",
"|                   |",
"|                   |",
"|                   |",
"|                   |",
"|                   |", 
"└───────────────────┘"];
lvl9 = [
"┌───────────────────┐",
"|                   |",
"|                   |",
"|                   |",
"|                   |",
"|                   |",
"|                   |",
"|                   |",
"|                   |",
"|                   |",
"|                   |",
"|                   |",
"|                   |",
"|                   |",
"|                   |",
"|                   |",
"|                   |",
"|                   |",
"|                   |",
"|                   |", 
"└───────────────────┘"];
lvl10 = [
"┌───────────────────┐",
"|                   |",
"|                   |",
"|                   |",
"|                   |",
"|                   |",
"|                   |",
"|                   |",
"|                   |",
"|                   |",
"|                   |",
"|                   |",
"|                   |",
"|                   |",
"|                   |",
"|                   |",
"|                   |",
"|                   |",
"|                   |",
"|                   |", 
"└───────────────────┘"];
